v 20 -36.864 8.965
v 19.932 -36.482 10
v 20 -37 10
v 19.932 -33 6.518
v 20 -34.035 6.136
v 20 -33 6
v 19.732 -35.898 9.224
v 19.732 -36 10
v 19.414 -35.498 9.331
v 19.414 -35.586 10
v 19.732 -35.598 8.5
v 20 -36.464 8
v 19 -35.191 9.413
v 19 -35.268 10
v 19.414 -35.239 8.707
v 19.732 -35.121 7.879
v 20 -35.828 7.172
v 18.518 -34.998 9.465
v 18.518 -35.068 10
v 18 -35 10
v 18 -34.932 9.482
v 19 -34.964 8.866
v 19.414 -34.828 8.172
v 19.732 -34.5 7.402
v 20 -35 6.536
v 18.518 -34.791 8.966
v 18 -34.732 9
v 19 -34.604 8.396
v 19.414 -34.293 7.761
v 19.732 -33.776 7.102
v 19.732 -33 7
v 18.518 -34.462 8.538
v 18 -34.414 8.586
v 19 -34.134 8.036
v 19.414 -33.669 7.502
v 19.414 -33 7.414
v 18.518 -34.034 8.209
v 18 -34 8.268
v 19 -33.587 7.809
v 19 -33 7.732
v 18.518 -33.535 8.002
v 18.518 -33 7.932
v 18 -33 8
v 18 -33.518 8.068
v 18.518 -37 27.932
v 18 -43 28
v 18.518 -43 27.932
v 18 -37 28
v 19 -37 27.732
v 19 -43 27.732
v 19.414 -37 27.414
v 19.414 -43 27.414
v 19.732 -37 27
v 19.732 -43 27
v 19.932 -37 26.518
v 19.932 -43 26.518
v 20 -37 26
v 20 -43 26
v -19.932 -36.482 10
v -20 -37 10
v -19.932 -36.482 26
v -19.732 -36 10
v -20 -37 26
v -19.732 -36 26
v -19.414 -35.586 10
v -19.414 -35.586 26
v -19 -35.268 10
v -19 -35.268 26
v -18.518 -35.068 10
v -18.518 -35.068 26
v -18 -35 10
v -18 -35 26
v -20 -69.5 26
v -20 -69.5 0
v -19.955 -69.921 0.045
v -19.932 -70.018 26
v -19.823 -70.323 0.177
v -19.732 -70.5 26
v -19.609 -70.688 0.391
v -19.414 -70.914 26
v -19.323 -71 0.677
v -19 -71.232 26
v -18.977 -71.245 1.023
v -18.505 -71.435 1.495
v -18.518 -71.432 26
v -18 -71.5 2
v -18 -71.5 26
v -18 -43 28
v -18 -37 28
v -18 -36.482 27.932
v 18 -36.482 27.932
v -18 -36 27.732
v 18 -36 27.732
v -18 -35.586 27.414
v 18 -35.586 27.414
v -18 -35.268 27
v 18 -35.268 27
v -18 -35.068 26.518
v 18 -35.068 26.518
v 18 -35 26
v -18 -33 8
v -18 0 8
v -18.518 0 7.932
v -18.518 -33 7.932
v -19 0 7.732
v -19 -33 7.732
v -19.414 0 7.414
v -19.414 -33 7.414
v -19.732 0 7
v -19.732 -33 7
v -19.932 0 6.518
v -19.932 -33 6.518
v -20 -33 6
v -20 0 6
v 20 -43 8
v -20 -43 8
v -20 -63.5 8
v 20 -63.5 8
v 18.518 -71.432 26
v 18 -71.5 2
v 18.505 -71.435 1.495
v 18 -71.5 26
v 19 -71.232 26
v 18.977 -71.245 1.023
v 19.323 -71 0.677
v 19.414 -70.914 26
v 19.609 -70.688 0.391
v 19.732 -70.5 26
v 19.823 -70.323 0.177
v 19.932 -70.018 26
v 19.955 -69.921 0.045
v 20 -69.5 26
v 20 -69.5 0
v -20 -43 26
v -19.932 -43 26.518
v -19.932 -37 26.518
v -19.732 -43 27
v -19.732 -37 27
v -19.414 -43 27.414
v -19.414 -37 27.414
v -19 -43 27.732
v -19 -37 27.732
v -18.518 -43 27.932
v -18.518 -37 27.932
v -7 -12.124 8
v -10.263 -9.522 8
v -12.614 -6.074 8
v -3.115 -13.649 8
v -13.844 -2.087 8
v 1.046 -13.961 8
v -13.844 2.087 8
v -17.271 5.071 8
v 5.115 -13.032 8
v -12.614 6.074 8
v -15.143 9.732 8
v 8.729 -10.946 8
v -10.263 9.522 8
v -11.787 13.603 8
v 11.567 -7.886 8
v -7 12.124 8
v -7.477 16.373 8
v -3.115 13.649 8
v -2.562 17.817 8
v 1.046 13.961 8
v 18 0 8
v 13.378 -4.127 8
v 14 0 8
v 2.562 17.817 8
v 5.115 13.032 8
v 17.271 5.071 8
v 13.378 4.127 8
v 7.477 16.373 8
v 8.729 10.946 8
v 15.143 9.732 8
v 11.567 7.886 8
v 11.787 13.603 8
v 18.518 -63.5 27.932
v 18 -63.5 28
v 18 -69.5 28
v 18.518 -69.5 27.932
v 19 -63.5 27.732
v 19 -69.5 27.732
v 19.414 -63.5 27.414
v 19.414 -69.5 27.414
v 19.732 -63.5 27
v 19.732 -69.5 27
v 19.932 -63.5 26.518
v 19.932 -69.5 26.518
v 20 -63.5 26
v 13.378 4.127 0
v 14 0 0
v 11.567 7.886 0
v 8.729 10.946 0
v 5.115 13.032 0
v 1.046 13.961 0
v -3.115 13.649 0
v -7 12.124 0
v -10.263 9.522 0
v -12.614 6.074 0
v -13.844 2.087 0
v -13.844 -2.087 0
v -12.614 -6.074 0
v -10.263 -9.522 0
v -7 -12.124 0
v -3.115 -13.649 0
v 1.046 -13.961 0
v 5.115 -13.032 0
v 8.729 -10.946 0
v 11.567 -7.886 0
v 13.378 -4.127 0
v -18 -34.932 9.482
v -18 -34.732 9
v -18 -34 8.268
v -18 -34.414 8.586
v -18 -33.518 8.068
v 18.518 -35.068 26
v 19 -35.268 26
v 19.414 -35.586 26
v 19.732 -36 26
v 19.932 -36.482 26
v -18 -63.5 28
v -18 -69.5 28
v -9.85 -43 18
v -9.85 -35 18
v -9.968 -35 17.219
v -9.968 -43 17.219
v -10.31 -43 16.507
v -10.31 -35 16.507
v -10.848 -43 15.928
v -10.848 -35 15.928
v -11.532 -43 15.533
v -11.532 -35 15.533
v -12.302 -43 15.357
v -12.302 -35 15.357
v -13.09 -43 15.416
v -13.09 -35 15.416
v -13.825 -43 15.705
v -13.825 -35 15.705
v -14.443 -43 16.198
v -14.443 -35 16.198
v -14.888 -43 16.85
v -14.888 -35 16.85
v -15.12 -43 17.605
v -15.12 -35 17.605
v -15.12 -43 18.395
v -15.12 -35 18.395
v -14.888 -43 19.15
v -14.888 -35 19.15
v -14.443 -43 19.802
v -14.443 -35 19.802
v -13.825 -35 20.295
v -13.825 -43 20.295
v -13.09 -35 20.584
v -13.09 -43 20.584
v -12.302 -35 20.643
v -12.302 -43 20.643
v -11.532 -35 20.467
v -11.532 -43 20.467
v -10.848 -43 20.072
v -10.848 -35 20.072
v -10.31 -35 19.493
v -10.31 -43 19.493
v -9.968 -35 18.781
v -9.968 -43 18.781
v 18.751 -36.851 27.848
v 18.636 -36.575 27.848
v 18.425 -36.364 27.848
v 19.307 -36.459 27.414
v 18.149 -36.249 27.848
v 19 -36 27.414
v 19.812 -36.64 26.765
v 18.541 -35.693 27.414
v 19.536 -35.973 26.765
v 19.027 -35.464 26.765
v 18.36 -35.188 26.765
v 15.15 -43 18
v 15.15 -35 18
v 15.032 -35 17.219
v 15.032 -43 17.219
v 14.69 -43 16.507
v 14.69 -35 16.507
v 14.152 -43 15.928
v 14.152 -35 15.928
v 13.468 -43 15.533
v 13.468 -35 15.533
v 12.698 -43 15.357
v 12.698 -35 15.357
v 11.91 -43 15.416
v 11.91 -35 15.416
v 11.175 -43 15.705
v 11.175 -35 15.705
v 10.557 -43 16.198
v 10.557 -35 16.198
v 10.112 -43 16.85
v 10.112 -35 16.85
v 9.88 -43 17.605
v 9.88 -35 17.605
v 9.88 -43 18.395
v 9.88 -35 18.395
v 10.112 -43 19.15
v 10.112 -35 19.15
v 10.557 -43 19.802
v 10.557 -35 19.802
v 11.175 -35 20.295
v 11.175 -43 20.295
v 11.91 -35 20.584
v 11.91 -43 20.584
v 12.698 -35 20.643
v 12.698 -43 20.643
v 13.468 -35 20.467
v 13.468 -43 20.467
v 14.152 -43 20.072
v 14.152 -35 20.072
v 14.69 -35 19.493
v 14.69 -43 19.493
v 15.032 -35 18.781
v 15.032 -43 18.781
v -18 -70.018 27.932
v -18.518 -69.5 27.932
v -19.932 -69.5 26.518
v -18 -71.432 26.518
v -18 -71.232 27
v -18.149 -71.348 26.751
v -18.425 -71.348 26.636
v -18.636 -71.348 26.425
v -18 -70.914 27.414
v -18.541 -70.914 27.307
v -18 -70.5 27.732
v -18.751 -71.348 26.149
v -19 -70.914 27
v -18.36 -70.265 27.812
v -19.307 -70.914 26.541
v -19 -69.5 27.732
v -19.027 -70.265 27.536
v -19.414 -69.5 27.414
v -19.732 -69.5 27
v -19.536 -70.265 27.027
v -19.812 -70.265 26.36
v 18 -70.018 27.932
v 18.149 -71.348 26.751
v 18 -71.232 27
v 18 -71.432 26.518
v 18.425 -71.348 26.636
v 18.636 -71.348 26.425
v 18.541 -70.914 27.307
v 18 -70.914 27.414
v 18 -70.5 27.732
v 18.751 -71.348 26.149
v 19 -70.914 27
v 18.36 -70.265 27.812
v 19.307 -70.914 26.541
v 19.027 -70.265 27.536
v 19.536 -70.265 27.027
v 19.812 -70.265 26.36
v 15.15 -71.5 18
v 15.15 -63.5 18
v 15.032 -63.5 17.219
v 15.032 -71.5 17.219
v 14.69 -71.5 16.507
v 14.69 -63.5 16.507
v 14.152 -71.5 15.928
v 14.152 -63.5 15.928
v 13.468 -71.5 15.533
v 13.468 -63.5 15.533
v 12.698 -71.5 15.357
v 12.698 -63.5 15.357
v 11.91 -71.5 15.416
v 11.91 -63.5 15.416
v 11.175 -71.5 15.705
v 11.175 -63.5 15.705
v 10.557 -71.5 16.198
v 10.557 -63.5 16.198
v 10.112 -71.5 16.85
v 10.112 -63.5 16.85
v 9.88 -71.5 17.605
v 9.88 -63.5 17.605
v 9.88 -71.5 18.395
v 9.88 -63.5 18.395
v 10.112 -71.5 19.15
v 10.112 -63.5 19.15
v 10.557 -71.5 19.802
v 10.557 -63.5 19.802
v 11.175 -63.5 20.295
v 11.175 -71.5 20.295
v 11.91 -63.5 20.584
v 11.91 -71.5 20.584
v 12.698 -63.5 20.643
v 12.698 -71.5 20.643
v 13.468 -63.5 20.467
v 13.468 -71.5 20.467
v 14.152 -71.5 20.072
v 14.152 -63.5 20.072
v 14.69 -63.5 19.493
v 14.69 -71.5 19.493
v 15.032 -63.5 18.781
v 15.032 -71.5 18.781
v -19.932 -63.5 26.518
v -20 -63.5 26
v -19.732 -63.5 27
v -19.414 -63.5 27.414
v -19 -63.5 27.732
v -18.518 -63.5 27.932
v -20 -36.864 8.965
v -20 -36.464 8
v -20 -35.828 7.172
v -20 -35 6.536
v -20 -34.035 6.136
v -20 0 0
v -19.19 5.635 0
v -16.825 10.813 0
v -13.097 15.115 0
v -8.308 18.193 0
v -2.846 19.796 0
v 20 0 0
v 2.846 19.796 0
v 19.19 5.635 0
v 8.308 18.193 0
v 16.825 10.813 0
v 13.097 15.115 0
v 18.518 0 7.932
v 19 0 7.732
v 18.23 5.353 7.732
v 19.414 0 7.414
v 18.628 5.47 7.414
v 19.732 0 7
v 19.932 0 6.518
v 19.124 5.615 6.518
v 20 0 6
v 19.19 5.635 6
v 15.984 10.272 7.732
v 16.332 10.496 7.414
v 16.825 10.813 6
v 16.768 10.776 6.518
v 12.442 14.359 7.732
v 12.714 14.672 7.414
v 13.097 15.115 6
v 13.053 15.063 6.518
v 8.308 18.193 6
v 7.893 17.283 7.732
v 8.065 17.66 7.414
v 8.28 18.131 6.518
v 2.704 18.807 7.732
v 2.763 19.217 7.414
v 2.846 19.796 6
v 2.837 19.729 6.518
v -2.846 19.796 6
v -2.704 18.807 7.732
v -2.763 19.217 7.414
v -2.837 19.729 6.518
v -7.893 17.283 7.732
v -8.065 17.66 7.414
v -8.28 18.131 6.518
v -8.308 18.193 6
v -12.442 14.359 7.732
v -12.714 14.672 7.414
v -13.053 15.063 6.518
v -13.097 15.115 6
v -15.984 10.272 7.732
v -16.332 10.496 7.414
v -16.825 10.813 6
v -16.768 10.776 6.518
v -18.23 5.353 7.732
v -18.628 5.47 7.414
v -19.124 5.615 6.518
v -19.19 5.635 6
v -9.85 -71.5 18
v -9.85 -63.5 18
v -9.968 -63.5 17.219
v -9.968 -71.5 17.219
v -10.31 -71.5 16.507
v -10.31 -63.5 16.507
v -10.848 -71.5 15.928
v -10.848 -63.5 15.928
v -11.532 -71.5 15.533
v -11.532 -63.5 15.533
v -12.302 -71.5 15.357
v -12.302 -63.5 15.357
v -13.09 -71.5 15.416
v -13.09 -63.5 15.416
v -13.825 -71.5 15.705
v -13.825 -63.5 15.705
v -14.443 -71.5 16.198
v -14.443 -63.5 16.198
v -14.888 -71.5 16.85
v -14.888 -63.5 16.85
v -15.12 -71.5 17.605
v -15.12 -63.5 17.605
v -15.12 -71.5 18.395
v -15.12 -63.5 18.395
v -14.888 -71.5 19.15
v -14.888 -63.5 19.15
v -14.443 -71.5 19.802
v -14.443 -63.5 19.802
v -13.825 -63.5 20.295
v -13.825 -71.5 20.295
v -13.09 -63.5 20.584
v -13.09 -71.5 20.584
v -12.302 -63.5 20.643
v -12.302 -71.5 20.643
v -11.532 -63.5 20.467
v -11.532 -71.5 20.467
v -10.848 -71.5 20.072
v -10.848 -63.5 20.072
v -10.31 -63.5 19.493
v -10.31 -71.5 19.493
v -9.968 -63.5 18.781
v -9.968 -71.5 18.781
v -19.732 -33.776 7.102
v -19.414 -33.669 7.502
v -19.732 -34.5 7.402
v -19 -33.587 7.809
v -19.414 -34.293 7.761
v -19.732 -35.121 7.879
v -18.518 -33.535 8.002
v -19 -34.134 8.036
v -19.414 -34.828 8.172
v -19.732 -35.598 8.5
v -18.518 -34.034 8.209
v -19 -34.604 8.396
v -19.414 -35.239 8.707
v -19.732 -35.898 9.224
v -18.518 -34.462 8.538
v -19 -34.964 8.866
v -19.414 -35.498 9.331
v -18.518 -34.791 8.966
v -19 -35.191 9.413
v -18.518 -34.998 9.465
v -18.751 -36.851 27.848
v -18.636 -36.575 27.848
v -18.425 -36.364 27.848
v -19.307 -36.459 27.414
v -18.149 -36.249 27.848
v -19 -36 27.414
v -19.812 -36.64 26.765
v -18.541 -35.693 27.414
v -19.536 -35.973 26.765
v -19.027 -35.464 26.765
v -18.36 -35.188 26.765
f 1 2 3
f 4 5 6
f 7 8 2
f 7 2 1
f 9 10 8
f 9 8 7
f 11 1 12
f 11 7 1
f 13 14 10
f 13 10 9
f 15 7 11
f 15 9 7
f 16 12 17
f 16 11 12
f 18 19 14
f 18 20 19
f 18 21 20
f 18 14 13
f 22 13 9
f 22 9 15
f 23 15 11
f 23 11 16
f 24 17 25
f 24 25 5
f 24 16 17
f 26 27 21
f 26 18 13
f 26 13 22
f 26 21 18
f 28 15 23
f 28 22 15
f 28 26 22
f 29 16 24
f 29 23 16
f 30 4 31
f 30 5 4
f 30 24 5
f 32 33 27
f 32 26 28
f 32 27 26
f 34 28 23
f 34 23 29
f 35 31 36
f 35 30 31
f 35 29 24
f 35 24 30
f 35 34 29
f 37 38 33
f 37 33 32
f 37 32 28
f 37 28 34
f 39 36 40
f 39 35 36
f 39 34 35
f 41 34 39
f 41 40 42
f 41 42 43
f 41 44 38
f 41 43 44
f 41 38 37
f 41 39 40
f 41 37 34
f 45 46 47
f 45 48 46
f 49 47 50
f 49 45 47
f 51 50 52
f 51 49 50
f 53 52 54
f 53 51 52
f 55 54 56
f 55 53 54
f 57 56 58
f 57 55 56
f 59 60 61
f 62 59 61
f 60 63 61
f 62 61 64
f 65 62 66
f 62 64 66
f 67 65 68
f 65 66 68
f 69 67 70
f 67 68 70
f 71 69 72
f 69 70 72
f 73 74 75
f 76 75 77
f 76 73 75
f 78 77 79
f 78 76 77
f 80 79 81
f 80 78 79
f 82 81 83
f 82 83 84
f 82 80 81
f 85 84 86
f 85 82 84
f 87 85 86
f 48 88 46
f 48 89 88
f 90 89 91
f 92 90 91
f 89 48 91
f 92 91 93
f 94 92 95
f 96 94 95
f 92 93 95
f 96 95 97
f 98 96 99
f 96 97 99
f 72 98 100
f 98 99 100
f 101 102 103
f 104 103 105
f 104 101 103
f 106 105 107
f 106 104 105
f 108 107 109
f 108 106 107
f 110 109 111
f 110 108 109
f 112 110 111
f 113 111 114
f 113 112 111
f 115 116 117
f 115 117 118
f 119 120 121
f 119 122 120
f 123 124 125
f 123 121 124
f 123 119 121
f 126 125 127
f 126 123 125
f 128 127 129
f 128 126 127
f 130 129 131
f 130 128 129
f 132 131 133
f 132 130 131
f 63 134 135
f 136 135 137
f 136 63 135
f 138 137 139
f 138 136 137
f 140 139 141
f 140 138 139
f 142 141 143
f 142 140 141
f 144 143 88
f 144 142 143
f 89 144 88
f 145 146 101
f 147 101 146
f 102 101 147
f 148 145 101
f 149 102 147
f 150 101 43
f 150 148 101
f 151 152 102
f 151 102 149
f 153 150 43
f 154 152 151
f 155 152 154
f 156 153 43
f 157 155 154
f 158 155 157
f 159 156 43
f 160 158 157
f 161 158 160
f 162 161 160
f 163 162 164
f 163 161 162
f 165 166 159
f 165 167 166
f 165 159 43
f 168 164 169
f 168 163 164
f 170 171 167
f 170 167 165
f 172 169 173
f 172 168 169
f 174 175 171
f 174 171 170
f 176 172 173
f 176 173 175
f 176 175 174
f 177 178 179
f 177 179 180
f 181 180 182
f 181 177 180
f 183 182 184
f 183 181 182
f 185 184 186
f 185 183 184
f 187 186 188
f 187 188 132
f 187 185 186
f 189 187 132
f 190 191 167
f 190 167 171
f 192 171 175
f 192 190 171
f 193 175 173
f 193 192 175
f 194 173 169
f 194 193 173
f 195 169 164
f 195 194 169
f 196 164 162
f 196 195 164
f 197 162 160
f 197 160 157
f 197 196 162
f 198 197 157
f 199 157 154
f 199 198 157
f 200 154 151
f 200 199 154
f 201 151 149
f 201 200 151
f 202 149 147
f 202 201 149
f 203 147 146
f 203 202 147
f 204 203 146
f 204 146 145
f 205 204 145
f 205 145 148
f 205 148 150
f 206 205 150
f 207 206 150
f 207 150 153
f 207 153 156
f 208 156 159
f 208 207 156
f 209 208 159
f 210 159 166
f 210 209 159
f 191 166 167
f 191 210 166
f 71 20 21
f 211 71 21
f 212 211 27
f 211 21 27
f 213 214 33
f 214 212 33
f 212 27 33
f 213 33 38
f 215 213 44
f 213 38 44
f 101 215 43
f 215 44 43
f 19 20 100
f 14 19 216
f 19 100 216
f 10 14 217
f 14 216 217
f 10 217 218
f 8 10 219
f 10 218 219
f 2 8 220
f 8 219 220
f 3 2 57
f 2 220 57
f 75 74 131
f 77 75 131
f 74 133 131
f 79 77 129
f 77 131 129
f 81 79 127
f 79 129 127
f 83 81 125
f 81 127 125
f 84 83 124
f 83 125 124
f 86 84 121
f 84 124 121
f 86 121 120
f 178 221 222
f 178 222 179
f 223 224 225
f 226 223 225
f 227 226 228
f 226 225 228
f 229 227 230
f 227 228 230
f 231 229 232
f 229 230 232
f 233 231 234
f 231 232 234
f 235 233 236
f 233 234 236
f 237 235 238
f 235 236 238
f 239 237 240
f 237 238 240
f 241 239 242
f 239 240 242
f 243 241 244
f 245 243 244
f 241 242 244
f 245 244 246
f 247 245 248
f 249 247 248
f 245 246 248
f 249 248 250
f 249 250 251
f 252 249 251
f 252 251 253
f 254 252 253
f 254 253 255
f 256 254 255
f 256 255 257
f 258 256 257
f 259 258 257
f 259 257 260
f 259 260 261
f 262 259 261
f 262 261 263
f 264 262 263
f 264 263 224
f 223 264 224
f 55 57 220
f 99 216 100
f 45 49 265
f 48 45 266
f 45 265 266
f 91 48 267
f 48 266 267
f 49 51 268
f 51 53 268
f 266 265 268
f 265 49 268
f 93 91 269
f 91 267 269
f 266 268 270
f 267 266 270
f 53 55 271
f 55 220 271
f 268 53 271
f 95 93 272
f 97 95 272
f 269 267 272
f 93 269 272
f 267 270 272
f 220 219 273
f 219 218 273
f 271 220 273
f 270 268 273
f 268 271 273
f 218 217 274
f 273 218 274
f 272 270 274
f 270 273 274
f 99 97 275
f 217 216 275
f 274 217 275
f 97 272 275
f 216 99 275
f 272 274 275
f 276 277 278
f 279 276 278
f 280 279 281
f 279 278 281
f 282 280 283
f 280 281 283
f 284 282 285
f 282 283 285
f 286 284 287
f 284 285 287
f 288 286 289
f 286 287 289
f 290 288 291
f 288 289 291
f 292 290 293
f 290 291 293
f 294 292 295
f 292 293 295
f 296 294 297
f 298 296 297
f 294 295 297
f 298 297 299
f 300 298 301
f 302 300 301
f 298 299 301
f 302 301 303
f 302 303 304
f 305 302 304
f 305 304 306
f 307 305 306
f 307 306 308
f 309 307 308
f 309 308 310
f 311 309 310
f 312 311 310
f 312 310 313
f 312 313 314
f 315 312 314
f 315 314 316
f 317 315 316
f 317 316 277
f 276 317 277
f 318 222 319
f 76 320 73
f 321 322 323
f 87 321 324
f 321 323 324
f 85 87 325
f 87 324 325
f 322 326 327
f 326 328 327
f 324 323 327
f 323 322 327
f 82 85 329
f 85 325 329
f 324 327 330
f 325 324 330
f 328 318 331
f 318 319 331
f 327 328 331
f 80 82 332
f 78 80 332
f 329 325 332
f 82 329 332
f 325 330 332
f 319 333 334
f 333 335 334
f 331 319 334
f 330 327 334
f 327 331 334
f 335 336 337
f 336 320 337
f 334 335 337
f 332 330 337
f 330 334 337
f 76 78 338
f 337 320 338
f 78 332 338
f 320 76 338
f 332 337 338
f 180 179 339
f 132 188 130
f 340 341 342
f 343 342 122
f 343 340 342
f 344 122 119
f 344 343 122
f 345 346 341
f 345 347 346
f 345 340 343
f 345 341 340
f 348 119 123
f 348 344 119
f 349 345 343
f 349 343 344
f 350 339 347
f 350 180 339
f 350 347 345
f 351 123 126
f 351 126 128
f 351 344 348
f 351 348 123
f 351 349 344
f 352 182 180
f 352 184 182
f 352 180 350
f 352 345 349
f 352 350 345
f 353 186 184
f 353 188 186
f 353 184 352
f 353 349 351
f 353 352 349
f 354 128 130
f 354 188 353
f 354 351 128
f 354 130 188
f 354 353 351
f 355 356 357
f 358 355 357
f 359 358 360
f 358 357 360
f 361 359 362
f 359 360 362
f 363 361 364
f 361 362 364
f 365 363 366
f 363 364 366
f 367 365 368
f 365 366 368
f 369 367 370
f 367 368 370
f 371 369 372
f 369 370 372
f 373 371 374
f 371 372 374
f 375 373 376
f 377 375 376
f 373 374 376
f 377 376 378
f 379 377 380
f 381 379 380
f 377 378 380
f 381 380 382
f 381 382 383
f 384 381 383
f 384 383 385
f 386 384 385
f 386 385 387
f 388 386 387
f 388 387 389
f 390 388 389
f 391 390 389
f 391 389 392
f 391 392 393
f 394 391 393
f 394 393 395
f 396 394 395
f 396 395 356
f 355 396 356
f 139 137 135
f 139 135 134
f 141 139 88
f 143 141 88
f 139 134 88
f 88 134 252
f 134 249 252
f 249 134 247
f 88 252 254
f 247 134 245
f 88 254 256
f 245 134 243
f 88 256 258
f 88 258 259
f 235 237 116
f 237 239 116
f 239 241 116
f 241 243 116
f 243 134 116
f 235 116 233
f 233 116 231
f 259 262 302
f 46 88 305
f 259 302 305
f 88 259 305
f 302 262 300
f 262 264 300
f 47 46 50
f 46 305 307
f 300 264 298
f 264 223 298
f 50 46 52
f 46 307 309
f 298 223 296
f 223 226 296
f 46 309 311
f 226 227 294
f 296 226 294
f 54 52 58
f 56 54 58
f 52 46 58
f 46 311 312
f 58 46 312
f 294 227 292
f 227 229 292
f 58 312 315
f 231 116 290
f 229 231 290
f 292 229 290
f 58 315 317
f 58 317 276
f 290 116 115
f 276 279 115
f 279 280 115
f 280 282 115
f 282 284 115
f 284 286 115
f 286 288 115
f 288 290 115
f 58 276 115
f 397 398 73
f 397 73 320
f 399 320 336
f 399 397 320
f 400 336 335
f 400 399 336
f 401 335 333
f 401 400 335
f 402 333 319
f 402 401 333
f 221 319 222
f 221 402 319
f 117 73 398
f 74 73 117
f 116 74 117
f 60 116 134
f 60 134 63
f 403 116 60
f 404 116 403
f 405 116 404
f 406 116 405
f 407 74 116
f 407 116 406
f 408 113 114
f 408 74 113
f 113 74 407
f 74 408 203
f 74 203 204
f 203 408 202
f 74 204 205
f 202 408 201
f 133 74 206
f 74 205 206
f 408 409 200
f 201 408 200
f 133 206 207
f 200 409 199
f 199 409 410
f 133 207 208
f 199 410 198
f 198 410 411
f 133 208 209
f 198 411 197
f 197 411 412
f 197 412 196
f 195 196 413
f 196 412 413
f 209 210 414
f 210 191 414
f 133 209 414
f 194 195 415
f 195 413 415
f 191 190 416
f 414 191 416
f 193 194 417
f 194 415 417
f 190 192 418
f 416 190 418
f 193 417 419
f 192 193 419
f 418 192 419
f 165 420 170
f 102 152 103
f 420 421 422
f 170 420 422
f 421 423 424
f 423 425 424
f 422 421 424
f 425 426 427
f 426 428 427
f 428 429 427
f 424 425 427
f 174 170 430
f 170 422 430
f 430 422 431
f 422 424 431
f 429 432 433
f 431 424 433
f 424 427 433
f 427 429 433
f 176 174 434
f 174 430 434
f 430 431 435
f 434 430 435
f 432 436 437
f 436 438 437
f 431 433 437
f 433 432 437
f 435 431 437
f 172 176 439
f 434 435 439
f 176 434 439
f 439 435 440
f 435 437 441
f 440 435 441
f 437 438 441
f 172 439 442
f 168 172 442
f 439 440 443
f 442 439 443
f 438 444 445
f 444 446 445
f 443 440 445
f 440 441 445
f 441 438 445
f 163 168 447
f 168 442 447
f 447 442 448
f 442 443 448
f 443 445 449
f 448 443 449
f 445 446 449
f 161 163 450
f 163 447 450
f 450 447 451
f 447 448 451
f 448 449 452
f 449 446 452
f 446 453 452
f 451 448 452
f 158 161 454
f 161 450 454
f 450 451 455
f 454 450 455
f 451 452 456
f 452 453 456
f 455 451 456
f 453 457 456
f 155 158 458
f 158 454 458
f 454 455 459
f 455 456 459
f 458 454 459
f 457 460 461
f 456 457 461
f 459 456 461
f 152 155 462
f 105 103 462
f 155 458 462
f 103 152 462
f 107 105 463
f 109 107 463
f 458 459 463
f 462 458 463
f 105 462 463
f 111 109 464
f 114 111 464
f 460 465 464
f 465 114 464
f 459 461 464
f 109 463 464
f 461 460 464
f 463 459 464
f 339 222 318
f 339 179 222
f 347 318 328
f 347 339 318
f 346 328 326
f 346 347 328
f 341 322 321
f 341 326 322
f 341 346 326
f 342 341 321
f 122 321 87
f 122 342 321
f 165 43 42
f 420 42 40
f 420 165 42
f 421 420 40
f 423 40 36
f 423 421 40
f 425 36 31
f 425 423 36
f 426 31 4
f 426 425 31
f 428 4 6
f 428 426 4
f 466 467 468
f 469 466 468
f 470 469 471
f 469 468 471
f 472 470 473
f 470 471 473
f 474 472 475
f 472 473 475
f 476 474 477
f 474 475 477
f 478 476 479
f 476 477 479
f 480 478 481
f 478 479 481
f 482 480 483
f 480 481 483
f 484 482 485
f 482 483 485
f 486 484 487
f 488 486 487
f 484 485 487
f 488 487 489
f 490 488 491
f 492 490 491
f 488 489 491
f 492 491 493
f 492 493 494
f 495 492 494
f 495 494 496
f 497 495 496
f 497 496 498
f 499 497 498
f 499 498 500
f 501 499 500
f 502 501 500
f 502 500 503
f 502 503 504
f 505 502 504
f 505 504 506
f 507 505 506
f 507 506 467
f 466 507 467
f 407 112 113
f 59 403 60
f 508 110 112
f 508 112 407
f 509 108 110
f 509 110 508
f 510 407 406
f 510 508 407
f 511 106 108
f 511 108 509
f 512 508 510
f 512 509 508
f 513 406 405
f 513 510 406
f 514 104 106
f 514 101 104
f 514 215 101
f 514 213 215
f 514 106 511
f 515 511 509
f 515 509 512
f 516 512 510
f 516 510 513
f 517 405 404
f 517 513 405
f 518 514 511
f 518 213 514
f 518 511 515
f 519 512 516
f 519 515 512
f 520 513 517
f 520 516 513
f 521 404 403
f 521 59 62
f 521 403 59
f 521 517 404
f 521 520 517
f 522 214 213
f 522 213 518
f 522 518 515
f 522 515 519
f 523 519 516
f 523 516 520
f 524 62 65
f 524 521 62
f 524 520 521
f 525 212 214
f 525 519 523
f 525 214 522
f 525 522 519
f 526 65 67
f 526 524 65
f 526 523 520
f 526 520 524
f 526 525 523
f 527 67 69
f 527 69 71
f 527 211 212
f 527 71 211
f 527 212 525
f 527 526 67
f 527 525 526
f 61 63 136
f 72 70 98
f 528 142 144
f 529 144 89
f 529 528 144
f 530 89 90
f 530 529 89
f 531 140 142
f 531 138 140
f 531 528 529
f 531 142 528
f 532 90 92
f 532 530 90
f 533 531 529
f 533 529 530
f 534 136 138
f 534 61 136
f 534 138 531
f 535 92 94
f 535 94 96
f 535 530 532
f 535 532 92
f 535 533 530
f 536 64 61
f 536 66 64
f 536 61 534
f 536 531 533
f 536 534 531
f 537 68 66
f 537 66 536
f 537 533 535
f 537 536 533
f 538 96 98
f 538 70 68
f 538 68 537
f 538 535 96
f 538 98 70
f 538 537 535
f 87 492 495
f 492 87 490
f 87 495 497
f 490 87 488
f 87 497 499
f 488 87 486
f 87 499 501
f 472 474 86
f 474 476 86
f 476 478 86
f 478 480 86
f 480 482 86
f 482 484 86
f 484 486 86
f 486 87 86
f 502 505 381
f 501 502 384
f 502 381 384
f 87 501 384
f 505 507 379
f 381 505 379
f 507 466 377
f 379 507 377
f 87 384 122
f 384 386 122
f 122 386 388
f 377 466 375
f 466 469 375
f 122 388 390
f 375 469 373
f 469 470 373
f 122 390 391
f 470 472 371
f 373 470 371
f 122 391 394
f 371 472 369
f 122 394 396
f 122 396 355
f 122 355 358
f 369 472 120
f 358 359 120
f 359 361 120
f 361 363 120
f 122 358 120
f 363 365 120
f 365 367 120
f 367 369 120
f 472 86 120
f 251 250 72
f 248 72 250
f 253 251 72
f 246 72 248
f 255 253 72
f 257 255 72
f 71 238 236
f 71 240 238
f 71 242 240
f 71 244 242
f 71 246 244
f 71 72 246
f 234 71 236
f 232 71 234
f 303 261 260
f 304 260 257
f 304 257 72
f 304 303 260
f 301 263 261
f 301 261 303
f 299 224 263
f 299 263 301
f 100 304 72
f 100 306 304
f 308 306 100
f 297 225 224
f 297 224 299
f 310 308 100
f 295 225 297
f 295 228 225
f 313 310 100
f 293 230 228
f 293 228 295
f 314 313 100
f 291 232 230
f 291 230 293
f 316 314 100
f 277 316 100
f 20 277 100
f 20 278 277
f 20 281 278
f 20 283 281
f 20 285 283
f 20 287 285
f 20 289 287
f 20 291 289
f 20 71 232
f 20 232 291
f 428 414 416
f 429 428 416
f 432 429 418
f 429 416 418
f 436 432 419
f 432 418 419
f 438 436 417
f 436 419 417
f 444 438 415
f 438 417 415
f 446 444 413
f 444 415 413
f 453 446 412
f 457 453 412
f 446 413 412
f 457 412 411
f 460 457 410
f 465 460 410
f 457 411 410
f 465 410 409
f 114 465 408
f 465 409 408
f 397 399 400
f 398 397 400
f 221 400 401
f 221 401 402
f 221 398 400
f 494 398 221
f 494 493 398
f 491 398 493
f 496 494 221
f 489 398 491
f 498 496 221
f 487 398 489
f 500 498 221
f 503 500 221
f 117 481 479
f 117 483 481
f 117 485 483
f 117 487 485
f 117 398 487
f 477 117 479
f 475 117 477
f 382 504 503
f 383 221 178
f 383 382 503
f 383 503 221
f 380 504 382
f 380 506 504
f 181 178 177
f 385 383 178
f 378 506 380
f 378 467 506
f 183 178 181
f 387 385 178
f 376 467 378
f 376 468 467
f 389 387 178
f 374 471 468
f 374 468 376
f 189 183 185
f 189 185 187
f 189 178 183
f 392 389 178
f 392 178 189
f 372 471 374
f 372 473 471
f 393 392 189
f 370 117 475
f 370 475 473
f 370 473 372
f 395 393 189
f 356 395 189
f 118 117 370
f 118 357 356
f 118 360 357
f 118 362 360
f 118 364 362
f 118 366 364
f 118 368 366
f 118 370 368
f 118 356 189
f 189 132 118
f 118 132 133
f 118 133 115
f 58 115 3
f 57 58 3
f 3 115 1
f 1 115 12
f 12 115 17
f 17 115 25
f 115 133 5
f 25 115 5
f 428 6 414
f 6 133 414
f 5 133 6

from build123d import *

# Parameters (mm, degrees)
SKETCH1_R           = 14
BOSS_EXTRUDE1_DEPTH = 8
SKETCH2_W           = 40
SKETCH2_H           = 8
BOSS_EXTRUDE2_DEPTH = 20
SKETCH3_R           = 2.65
CUT_EXTRUDE1_DEPTH  = 37.5
FILLET1_R           = 2


with BuildPart() as part:
    # Sketch1 → Boss-Extrude1 (new body)
    with BuildSketch(Plane.XY):
        with BuildLine():
            Line((-20, 0), (-20, -71.5))
            Line((-20, -71.5), (20, -71.5))
            Line((20, -71.5), (20, 0))
            ThreePointArc((20, 0), (0, 20), (-20, 0))
        make_face()
        Circle(SKETCH1_R, mode=Mode.SUBTRACT)
    extrude(amount=BOSS_EXTRUDE1_DEPTH)

    # Sketch2 → Boss-Extrude2 (add)
    with BuildSketch(Plane.XY.offset(8)):
        with Locations((0, -39)):
            Rectangle(SKETCH2_W, SKETCH2_H)
        with Locations((0, -67.5)):
            Rectangle(SKETCH2_W, SKETCH2_H)
    extrude(amount=BOSS_EXTRUDE2_DEPTH)

    # Sketch3 → Cut-Extrude1 (cut, through all)
    with BuildSketch(Plane(origin=(0, -35, 0), x_dir=(1, 0, 0), z_dir=(0, 1, 0))):
        with Locations((-12.5, -18)):
            Circle(SKETCH3_R)
        with Locations((12.5, -18)):
            Circle(SKETCH3_R)
    extrude(amount=-CUT_EXTRUDE1_DEPTH, mode=Mode.SUBTRACT)

    # Fillet1
    fillet1_edges = [part.edges().sort_by_distance(p)[0] for p in [
        (20, -17.5, 8),
        (-20, -35, 18),
        (0, -35, 8),
        (20, -35, 18),
        (-20, -39, 28),
        (20, -39, 28),
        (0, -35, 28),
        (20, -67.5, 28),
        (-20, -67.5, 28),
        (0, -71.5, 28),
        (0, 20, 8),
        (0, -71.5, 0),
        (20, -71.5, 14),
        (-20, -71.5, 14),
        (-20, -17.5, 8),
    ]]
    fillet(fillet1_edges, radius=FILLET1_R)


solid = part.part
